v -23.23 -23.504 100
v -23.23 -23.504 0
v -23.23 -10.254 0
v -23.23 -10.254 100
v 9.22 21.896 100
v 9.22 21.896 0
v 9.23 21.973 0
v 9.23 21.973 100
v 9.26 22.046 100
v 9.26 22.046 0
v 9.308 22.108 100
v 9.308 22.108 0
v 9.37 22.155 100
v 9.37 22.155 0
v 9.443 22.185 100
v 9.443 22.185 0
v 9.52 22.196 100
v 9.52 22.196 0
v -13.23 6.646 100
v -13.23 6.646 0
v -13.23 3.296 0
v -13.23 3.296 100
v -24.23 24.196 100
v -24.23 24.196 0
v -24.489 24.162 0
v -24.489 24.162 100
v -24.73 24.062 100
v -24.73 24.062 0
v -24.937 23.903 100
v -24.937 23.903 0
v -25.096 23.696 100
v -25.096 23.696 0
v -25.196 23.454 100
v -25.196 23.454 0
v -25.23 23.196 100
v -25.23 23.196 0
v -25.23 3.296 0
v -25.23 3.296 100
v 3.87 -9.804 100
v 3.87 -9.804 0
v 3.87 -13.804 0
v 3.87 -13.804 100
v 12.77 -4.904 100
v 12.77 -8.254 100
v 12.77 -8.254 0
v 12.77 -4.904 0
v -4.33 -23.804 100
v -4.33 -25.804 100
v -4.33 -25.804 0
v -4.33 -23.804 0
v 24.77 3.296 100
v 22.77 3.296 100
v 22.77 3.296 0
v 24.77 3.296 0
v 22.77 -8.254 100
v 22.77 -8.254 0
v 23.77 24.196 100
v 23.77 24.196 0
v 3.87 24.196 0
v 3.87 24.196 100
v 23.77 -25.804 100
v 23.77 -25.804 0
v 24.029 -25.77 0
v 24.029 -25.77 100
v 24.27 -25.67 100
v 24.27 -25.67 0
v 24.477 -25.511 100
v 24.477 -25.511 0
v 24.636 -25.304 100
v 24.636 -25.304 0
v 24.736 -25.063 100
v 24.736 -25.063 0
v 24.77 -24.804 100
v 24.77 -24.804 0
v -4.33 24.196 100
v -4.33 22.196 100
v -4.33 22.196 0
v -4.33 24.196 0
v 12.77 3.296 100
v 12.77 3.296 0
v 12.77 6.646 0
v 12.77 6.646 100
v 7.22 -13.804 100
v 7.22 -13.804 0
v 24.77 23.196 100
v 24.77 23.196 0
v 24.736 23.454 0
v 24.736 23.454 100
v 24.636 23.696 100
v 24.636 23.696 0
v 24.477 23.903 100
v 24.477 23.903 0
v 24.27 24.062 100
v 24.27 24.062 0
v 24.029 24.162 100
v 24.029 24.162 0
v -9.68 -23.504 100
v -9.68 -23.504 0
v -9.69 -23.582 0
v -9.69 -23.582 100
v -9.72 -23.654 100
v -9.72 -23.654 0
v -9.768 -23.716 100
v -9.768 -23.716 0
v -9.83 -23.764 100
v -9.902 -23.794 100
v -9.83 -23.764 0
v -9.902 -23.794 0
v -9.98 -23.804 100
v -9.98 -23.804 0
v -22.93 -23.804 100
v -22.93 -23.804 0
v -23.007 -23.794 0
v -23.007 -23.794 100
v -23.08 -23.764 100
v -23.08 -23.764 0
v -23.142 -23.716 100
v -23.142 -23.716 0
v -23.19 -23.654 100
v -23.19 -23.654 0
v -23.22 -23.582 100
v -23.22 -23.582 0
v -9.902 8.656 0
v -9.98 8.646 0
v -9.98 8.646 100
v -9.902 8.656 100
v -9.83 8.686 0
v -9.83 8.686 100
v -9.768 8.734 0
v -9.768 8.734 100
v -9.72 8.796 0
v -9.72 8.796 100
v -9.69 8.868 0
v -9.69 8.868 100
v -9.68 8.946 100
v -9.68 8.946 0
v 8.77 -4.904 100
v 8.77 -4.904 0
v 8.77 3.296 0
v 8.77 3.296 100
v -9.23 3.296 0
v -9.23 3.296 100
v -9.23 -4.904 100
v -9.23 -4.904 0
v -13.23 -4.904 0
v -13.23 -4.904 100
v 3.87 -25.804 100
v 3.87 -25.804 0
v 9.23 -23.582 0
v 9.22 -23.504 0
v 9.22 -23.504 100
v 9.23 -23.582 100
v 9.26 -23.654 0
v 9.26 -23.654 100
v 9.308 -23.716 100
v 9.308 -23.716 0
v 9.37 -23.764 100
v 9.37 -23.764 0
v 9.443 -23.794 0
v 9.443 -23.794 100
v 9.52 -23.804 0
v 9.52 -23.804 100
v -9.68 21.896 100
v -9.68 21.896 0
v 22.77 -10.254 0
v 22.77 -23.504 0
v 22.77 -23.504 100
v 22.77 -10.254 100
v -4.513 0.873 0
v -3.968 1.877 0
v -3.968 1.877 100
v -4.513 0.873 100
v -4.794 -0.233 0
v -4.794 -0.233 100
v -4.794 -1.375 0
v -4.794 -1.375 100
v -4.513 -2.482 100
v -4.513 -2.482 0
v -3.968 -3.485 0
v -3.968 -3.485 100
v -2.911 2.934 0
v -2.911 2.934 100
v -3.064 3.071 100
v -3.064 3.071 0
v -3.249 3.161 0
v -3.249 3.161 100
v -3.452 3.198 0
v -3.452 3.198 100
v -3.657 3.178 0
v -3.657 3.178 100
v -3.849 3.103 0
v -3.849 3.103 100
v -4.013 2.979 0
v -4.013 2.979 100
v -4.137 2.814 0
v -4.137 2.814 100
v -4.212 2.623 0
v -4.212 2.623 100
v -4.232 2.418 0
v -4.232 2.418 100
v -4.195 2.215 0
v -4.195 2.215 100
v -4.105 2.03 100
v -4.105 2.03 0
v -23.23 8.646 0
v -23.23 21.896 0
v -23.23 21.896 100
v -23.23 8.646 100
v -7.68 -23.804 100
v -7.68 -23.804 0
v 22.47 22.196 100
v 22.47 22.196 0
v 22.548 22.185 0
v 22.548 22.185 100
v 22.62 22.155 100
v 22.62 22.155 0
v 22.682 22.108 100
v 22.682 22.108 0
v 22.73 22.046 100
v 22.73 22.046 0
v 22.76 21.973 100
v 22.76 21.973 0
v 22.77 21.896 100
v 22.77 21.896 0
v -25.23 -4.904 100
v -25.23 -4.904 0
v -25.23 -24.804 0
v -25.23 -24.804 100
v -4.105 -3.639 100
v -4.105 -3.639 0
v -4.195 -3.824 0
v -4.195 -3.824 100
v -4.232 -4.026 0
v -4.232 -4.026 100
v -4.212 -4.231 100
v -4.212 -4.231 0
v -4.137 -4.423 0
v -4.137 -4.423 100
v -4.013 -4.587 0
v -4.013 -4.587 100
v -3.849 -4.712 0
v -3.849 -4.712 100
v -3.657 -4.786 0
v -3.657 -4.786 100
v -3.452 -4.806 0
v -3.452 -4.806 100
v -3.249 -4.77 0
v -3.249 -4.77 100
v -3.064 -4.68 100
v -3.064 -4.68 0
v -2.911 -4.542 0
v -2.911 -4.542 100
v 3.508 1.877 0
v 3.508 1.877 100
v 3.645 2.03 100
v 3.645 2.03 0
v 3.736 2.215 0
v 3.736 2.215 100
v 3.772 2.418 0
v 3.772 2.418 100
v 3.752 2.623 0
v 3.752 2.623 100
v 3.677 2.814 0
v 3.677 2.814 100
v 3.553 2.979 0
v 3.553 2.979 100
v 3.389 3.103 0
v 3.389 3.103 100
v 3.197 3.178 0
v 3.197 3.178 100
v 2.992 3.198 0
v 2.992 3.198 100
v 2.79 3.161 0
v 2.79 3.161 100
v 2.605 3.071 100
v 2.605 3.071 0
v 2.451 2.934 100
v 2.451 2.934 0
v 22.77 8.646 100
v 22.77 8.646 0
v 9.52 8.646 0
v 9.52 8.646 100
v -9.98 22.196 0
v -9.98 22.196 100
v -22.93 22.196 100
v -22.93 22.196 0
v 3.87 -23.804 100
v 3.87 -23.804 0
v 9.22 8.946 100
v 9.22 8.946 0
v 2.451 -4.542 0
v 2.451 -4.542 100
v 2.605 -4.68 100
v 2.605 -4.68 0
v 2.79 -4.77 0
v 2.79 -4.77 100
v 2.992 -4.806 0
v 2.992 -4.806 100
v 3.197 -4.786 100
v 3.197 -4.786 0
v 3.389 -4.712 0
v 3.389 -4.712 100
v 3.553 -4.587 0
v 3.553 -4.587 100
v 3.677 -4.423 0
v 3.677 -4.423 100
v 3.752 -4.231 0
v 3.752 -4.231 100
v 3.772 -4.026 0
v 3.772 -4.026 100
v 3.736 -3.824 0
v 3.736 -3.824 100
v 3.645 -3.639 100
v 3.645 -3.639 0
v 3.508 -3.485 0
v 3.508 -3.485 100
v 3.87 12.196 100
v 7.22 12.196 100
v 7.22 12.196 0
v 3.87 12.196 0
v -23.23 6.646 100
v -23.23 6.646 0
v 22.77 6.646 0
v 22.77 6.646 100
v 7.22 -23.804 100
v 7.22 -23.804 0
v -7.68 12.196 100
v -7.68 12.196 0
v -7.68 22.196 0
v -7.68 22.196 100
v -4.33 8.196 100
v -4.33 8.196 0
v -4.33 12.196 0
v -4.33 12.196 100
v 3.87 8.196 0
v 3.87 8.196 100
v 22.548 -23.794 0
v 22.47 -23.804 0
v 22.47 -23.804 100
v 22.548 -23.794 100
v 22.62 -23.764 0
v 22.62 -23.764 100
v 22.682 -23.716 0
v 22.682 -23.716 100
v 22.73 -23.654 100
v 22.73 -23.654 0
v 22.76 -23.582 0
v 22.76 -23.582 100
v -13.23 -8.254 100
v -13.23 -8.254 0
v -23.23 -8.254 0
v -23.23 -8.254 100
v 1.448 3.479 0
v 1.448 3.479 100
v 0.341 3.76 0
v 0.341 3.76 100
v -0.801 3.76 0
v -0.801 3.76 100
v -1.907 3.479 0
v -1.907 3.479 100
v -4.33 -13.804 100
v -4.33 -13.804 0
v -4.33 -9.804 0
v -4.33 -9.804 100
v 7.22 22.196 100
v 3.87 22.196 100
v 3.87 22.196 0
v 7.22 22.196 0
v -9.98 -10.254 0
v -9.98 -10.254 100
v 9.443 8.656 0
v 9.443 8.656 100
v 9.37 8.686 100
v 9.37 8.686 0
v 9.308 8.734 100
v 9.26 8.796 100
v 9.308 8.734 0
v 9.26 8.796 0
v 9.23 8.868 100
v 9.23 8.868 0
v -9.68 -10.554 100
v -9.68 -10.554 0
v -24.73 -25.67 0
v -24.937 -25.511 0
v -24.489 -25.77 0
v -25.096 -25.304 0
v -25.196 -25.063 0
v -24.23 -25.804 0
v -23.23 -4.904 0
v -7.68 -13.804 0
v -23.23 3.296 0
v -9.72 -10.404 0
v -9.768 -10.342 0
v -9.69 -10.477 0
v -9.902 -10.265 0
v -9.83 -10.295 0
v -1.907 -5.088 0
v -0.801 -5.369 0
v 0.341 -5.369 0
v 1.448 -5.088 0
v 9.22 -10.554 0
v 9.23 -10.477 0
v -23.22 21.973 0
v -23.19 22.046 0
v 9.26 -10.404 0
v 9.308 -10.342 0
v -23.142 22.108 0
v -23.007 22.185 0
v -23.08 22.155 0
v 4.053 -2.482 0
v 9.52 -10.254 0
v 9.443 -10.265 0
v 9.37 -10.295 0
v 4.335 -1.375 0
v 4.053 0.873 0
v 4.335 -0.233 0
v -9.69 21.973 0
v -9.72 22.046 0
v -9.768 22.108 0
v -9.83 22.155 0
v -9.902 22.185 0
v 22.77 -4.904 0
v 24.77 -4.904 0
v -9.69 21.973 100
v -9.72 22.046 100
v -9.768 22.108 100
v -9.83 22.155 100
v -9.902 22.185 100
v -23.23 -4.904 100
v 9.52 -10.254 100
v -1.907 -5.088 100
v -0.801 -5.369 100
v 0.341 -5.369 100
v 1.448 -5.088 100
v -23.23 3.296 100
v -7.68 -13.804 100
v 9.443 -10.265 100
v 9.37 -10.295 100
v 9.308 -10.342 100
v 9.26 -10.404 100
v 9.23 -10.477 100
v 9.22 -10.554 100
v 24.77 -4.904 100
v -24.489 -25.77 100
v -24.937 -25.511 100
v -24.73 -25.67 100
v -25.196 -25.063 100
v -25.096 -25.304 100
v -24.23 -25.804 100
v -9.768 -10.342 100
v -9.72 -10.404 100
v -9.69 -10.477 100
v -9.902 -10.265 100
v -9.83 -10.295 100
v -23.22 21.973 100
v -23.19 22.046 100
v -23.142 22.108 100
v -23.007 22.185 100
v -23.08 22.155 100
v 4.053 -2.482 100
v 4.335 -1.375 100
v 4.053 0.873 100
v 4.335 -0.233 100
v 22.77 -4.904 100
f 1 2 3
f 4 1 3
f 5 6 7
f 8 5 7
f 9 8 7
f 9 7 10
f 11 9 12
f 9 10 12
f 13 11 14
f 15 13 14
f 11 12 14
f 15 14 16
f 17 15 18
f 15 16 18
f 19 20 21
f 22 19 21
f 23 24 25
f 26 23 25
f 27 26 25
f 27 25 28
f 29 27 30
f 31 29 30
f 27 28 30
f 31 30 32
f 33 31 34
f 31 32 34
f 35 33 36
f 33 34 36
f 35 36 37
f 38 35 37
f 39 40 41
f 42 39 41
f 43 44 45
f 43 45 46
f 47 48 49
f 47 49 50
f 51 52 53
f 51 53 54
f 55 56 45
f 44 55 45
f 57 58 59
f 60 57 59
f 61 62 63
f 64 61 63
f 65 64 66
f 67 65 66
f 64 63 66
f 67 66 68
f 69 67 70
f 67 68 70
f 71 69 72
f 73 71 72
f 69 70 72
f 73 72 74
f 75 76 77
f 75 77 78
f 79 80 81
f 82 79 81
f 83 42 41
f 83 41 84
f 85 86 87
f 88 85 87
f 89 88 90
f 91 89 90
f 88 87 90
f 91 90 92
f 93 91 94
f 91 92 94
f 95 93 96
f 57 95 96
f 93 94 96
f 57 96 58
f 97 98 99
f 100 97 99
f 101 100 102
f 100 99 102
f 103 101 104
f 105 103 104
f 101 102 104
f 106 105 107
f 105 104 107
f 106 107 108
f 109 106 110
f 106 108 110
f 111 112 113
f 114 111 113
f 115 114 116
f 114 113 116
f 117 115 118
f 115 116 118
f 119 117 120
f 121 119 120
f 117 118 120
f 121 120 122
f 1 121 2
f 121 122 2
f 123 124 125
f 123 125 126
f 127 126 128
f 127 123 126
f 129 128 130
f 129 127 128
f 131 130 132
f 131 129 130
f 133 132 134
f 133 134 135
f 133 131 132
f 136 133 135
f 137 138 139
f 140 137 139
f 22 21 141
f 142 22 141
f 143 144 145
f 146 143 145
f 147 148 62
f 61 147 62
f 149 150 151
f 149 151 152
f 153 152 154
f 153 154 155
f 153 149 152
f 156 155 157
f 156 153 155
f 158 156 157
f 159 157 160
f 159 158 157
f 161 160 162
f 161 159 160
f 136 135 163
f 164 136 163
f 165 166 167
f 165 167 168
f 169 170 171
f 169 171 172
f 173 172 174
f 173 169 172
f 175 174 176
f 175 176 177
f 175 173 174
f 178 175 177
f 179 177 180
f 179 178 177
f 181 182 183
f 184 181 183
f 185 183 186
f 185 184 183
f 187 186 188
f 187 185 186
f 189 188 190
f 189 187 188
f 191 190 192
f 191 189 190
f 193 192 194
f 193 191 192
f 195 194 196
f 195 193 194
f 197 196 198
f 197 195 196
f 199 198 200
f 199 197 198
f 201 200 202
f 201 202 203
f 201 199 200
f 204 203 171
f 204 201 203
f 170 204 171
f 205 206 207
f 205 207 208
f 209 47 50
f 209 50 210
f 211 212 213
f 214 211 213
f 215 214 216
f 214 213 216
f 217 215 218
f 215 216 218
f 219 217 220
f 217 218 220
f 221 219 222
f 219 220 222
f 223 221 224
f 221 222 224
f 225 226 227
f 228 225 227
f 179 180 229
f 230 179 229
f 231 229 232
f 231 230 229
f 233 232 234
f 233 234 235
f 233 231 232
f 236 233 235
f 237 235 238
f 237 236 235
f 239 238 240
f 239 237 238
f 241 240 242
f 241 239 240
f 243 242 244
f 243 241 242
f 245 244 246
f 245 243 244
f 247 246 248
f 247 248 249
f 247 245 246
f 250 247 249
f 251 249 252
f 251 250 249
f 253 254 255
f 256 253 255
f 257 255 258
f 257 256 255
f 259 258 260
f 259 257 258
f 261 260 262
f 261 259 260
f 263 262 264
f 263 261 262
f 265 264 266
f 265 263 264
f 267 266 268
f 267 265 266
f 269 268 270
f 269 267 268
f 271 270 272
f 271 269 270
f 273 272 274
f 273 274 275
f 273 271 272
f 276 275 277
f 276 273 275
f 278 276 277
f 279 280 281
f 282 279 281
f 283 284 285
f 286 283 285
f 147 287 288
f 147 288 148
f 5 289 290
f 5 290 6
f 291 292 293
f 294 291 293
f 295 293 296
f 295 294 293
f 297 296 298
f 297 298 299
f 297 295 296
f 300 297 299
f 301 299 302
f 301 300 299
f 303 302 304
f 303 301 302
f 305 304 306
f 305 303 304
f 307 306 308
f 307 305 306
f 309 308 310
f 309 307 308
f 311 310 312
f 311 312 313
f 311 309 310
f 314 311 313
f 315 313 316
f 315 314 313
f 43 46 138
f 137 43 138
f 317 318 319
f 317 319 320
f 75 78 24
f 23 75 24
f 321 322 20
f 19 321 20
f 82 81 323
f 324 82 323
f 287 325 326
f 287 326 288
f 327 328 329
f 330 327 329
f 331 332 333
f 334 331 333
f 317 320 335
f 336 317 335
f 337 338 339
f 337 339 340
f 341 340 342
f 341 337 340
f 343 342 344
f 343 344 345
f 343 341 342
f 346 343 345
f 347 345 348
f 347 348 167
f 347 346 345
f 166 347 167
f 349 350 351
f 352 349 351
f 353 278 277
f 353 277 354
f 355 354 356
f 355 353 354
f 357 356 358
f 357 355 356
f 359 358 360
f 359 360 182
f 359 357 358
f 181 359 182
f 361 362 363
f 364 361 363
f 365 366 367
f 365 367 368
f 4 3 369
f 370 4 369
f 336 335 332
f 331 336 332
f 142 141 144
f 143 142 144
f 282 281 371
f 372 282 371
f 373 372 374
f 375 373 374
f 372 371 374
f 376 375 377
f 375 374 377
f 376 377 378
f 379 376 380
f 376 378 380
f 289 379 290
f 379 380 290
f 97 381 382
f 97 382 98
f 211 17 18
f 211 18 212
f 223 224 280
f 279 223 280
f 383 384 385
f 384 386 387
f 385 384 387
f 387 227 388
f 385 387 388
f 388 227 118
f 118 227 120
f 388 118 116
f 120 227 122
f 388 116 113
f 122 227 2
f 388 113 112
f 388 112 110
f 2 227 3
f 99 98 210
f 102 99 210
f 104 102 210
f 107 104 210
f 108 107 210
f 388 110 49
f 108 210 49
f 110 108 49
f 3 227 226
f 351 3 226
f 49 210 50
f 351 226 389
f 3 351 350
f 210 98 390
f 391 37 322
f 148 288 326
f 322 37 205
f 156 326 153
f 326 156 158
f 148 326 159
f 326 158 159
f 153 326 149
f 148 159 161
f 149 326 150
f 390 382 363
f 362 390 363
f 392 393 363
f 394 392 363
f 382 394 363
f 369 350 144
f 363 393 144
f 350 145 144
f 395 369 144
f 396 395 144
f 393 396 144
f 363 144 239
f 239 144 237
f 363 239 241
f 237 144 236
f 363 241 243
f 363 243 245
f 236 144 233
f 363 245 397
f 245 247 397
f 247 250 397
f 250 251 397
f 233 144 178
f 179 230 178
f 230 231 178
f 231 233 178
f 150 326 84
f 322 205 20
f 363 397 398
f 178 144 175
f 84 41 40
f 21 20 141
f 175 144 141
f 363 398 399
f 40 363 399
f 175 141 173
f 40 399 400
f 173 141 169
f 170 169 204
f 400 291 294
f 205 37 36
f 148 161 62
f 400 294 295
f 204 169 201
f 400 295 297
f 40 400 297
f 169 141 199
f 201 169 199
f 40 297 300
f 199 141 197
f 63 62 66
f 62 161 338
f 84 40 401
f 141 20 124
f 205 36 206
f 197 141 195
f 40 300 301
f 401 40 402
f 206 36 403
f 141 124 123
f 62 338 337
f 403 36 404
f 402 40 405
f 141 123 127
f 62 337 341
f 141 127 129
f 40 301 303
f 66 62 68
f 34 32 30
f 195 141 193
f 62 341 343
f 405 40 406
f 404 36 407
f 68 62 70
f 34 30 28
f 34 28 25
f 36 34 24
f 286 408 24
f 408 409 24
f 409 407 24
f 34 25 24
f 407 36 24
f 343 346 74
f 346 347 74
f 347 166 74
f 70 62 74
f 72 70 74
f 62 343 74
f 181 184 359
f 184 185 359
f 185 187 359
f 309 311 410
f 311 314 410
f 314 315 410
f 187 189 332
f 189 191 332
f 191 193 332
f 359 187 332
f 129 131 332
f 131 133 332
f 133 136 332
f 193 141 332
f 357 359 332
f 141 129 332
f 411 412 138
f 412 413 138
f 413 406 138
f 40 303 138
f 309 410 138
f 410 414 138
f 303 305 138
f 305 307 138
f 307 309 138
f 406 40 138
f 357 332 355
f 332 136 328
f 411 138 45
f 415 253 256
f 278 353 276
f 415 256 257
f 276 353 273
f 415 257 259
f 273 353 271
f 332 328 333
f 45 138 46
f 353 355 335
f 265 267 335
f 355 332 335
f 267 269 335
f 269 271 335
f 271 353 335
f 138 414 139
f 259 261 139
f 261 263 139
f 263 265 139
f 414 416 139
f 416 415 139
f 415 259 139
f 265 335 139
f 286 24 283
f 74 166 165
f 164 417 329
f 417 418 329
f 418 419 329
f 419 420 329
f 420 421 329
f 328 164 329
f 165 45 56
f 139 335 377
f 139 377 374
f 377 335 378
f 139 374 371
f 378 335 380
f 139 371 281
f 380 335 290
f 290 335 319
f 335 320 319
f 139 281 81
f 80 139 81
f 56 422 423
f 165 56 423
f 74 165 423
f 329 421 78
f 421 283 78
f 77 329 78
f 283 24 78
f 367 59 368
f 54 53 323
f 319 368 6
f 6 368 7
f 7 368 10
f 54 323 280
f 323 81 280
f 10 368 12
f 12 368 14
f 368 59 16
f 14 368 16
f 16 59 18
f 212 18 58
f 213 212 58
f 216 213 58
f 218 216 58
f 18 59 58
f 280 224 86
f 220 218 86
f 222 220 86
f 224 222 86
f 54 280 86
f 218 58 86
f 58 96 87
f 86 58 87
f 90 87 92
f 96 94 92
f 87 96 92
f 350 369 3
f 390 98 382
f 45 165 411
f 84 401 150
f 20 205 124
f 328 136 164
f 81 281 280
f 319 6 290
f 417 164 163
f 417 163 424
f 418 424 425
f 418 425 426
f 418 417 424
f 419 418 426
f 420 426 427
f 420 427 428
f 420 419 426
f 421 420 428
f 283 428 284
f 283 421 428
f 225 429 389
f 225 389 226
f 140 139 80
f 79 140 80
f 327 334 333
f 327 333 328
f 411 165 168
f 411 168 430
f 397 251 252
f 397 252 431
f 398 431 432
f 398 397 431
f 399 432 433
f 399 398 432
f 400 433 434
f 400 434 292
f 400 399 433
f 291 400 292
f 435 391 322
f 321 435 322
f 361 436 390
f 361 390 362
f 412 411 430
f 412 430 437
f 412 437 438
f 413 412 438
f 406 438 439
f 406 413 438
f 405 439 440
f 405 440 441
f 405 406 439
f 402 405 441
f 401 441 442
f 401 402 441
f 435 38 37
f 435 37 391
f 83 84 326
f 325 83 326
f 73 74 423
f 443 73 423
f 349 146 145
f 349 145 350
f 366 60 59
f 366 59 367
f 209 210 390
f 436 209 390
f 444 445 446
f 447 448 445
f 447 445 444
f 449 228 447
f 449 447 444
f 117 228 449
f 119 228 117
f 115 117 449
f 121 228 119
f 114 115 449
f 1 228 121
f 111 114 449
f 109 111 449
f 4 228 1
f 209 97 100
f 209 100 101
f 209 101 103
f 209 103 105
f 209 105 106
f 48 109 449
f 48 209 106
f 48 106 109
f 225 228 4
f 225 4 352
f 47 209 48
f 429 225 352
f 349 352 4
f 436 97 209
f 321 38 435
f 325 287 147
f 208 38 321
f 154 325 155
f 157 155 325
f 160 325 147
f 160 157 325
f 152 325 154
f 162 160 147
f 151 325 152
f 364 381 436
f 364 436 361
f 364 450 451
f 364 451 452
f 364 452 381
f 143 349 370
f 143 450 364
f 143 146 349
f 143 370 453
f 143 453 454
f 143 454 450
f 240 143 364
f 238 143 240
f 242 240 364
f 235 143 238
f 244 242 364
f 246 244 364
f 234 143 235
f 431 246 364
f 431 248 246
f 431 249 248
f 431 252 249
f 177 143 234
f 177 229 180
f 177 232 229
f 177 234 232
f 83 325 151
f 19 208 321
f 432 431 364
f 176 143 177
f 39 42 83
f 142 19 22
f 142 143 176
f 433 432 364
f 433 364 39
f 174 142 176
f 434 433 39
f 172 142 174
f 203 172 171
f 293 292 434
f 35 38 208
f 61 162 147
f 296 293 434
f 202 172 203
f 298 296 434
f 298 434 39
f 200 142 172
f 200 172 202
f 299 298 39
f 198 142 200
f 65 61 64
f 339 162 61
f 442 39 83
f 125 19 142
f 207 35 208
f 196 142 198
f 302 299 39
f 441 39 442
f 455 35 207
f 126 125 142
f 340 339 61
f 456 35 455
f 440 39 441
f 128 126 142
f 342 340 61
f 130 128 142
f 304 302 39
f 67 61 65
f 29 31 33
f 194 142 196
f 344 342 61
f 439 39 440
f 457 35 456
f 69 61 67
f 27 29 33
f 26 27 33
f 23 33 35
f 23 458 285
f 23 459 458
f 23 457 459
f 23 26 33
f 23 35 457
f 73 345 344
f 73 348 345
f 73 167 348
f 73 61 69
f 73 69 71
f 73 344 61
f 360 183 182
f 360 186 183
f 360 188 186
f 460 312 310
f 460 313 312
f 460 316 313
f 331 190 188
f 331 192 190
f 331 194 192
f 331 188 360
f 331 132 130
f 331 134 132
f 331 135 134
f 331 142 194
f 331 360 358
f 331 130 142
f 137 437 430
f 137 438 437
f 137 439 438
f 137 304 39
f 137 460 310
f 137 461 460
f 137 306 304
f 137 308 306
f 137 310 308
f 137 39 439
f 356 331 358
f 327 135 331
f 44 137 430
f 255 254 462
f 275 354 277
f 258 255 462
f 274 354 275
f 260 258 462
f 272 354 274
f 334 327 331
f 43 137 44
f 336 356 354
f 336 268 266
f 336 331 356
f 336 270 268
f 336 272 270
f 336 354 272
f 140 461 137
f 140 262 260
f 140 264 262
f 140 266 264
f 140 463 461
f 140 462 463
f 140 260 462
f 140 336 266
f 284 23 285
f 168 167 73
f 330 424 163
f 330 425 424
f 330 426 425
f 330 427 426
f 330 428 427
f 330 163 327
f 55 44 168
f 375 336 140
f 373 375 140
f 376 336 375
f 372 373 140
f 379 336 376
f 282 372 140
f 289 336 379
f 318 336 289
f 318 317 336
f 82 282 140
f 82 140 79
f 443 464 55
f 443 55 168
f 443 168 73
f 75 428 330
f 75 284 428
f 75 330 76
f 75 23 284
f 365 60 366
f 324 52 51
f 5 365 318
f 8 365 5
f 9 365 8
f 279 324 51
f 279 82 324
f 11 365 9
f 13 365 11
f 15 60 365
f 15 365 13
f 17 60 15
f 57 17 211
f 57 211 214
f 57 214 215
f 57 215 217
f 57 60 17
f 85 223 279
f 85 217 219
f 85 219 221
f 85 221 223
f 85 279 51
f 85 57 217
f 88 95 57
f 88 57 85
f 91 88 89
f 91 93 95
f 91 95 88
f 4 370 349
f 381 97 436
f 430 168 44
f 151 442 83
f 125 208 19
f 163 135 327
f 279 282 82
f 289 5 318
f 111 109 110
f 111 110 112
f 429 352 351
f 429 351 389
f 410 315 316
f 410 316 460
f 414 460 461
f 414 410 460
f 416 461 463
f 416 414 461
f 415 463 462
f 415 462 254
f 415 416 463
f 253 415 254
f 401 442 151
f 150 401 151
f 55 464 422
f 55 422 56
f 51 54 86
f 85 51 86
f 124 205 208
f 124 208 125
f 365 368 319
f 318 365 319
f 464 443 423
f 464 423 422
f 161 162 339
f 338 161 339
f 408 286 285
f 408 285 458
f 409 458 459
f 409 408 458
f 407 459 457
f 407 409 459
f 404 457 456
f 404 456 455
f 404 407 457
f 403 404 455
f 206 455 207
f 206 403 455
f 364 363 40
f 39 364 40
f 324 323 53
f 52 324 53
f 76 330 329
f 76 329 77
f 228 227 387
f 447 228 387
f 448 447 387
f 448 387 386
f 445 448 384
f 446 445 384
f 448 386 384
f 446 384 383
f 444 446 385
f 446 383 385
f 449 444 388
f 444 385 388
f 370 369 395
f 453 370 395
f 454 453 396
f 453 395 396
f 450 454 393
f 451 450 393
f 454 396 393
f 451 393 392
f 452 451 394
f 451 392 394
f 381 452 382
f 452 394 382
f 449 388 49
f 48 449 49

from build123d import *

# Parameters (mm, degrees)
EXTRUDE_1_DEPTH = 100


with BuildPart() as part:
    # 草图1 → 凸台-拉伸1 (new body)
    with BuildSketch(Plane.XY):
        with BuildLine():
            Line((-4.329808423, 24.195670518), (-24.229808423, 24.195670518))
            ThreePointArc((-24.229808423, 24.195670518), (-24.936915205, 23.902777299), (-25.229808423, 23.195670518))
            Line((-25.229808423, 23.195670518), (-25.229808423, 3.295670518))
            Line((-25.229808423, 3.295670518), (-23.229808423, 3.295670518))
            Line((-23.229808423, 3.295670518), (-23.229808423, 6.645670518))
            Line((-23.229808423, 6.645670518), (-13.229808423, 6.645670518))
            Line((-13.229808423, 6.645670518), (-13.229808423, 3.295670518))
            Line((-13.229808423, 3.295670518), (-9.229808423, 3.295670518))
            Line((-9.229808423, 3.295670518), (-9.229808423, -4.904329482))
            Line((-9.229808423, -4.904329482), (-13.229808423, -4.904329482))
            Line((-13.229808423, -4.904329482), (-13.229808423, -8.254329482))
            Line((-13.229808423, -8.254329482), (-23.229808423, -8.254329482))
            Line((-23.229808423, -8.254329482), (-23.229808423, -4.904329482))
            Line((-23.229808423, -4.904329482), (-25.229808423, -4.904329482))
            Line((-25.229808423, -4.904329482), (-25.229808423, -24.804329482))
            ThreePointArc((-25.229808423, -24.804329482), (-24.936915205, -25.511436263), (-24.229808423, -25.804329482))
            Line((-24.229808423, -25.804329482), (-4.329808423, -25.804329482))
            Line((-4.329808423, -25.804329482), (-4.329808423, -23.804329482))
            Line((-4.329808423, -23.804329482), (-7.679808423, -23.804329482))
            Line((-7.679808423, -23.804329482), (-7.679808423, -13.804329482))
            Line((-7.679808423, -13.804329482), (-4.329808423, -13.804329482))
            Line((-4.329808423, -13.804329482), (-4.329808423, -9.804329482))
            Line((-4.329808423, -9.804329482), (3.870191577, -9.804329482))
            Line((3.870191577, -9.804329482), (3.870191577, -13.804329482))
            Line((3.870191577, -13.804329482), (7.220191577, -13.804329482))
            Line((7.220191577, -13.804329482), (7.220191577, -23.804329482))
            Line((7.220191577, -23.804329482), (3.870191577, -23.804329482))
            Line((3.870191577, -23.804329482), (3.870191577, -25.804329482))
            Line((3.870191577, -25.804329482), (23.770191577, -25.804329482))
            ThreePointArc((23.770191577, -25.804329482), (24.477298358, -25.511436263), (24.770191577, -24.804329482))
            Line((24.770191577, -24.804329482), (24.770191577, -4.904329482))
            Line((24.770191577, -4.904329482), (22.770191577, -4.904329482))
            Line((22.770191577, -4.904329482), (22.770191577, -8.254329482))
            Line((22.770191577, -8.254329482), (12.770191577, -8.254329482))
            Line((12.770191577, -8.254329482), (12.770191577, -4.904329482))
            Line((12.770191577, -4.904329482), (8.770191577, -4.904329482))
            Line((8.770191577, -4.904329482), (8.770191577, 3.295670518))
            Line((8.770191577, 3.295670518), (12.770191577, 3.295670518))
            Line((12.770191577, 3.295670518), (12.770191577, 6.645670518))
            Line((12.770191577, 6.645670518), (22.770191577, 6.645670518))
            Line((22.770191577, 6.645670518), (22.770191577, 3.295670518))
            Line((22.770191577, 3.295670518), (24.770191577, 3.295670518))
            Line((24.770191577, 3.295670518), (24.770191577, 23.195670518))
            ThreePointArc((24.770191577, 23.195670518), (24.477298358, 23.902777299), (23.770191577, 24.195670518))
            Line((23.770191577, 24.195670518), (3.870191577, 24.195670518))
            Line((3.870191577, 24.195670518), (3.870191577, 22.195670518))
            Line((3.870191577, 22.195670518), (7.220191577, 22.195670518))
            Line((7.220191577, 22.195670518), (7.220191577, 12.195670518))
            Line((7.220191577, 12.195670518), (3.870191577, 12.195670518))
            Line((3.870191577, 12.195670518), (3.870191577, 8.195670518))
            Line((3.870191577, 8.195670518), (-4.329808423, 8.195670518))
            Line((-4.329808423, 8.195670518), (-4.329808423, 12.195670518))
            Line((-4.329808423, 12.195670518), (-7.679808423, 12.195670518))
            Line((-7.679808423, 12.195670518), (-7.679808423, 22.195670518))
            Line((-7.679808423, 22.195670518), (-4.329808423, 22.195670518))
            Line((-4.329808423, 22.195670518), (-4.329808423, 24.195670518))
        make_face()
        with BuildLine():
            Line((-23.229808423, 8.645670518), (-9.979808423, 8.645670518))
            ThreePointArc((-9.979808423, 8.645670518), (-9.767676389, 8.733538484), (-9.679808423, 8.945670518))
            Line((-9.679808423, 8.945670518), (-9.679808423, 21.895670518))
            ThreePointArc((-9.679808423, 21.895670518), (-9.767676389, 22.107802553), (-9.979808423, 22.195670518))
            Line((-9.979808423, 22.195670518), (-22.929808423, 22.195670518))
            ThreePointArc((-22.929808423, 22.195670518), (-23.141940458, 22.107802553), (-23.229808423, 21.895670518))
            Line((-23.229808423, 21.895670518), (-23.229808423, 8.645670518))
        make_face(mode=Mode.SUBTRACT)
        with BuildLine():
            Line((22.770191577, 8.645670518), (9.520191577, 8.645670518))
            ThreePointArc((9.520191577, 8.645670518), (9.308059542, 8.733538484), (9.220191577, 8.945670518))
            Line((9.220191577, 8.945670518), (9.220191577, 21.895670518))
            ThreePointArc((9.220191577, 21.895670518), (9.308059542, 22.107802553), (9.520191577, 22.195670518))
            Line((9.520191577, 22.195670518), (22.470191577, 22.195670518))
            ThreePointArc((22.470191577, 22.195670518), (22.682323611, 22.107802553), (22.770191577, 21.895670518))
            Line((22.770191577, 21.895670518), (22.770191577, 8.645670518))
        make_face(mode=Mode.SUBTRACT)
        with BuildLine():
            Line((-23.229808423, -10.254329482), (-9.979808423, -10.254329482))
            ThreePointArc((-9.979808423, -10.254329482), (-9.767676389, -10.342197447), (-9.679808423, -10.554329482))
            Line((-9.679808423, -10.554329482), (-9.679808423, -23.504329482))
            ThreePointArc((-9.679808423, -23.504329482), (-9.767676389, -23.716461516), (-9.979808423, -23.804329482))
            Line((-9.979808423, -23.804329482), (-22.929808423, -23.804329482))
            ThreePointArc((-22.929808423, -23.804329482), (-23.141940458, -23.716461516), (-23.229808423, -23.504329482))
            Line((-23.229808423, -23.504329482), (-23.229808423, -10.254329482))
        make_face(mode=Mode.SUBTRACT)
        with BuildLine():
            Line((22.770191577, -10.254329482), (9.520191577, -10.254329482))
            ThreePointArc((9.520191577, -10.254329482), (9.308059542, -10.342197447), (9.220191577, -10.554329482))
            Line((9.220191577, -10.554329482), (9.220191577, -23.504329482))
            ThreePointArc((9.220191577, -23.504329482), (9.308059542, -23.716461516), (9.520191577, -23.804329482))
            Line((9.520191577, -23.804329482), (22.470191577, -23.804329482))
            ThreePointArc((22.470191577, -23.804329482), (22.682323611, -23.716461516), (22.770191577, -23.504329482))
            Line((22.770191577, -23.504329482), (22.770191577, -10.254329482))
        make_face(mode=Mode.SUBTRACT)
        with BuildLine():
            ThreePointArc((2.451084423, 2.933693197), (-0.229808423, 3.795670518), (-2.91070127, 2.933693197))
            ThreePointArc((-2.91070127, 2.933693197), (-4.012829703, 2.978691798), (-3.967831102, 1.876563365))
            ThreePointArc((-3.967831102, 1.876563365), (-4.829808423, -0.804329482), (-3.967831102, -3.485222328))
            ThreePointArc((-3.967831102, -3.485222328), (-4.012829703, -4.587350761), (-2.91070127, -4.54235216))
            ThreePointArc((-2.91070127, -4.54235216), (-0.229808423, -5.404329482), (2.451084423, -4.54235216))
            ThreePointArc((2.451084423, -4.54235216), (3.553212856, -4.587350761), (3.508214255, -3.485222328))
            ThreePointArc((3.508214255, -3.485222328), (4.370191577, -0.804329482), (3.508214255, 1.876563365))
            ThreePointArc((3.508214255, 1.876563365), (3.553212856, 2.978691798), (2.451084423, 2.933693197))
        make_face(mode=Mode.SUBTRACT)
    extrude(amount=EXTRUDE_1_DEPTH)


solid = part.part
